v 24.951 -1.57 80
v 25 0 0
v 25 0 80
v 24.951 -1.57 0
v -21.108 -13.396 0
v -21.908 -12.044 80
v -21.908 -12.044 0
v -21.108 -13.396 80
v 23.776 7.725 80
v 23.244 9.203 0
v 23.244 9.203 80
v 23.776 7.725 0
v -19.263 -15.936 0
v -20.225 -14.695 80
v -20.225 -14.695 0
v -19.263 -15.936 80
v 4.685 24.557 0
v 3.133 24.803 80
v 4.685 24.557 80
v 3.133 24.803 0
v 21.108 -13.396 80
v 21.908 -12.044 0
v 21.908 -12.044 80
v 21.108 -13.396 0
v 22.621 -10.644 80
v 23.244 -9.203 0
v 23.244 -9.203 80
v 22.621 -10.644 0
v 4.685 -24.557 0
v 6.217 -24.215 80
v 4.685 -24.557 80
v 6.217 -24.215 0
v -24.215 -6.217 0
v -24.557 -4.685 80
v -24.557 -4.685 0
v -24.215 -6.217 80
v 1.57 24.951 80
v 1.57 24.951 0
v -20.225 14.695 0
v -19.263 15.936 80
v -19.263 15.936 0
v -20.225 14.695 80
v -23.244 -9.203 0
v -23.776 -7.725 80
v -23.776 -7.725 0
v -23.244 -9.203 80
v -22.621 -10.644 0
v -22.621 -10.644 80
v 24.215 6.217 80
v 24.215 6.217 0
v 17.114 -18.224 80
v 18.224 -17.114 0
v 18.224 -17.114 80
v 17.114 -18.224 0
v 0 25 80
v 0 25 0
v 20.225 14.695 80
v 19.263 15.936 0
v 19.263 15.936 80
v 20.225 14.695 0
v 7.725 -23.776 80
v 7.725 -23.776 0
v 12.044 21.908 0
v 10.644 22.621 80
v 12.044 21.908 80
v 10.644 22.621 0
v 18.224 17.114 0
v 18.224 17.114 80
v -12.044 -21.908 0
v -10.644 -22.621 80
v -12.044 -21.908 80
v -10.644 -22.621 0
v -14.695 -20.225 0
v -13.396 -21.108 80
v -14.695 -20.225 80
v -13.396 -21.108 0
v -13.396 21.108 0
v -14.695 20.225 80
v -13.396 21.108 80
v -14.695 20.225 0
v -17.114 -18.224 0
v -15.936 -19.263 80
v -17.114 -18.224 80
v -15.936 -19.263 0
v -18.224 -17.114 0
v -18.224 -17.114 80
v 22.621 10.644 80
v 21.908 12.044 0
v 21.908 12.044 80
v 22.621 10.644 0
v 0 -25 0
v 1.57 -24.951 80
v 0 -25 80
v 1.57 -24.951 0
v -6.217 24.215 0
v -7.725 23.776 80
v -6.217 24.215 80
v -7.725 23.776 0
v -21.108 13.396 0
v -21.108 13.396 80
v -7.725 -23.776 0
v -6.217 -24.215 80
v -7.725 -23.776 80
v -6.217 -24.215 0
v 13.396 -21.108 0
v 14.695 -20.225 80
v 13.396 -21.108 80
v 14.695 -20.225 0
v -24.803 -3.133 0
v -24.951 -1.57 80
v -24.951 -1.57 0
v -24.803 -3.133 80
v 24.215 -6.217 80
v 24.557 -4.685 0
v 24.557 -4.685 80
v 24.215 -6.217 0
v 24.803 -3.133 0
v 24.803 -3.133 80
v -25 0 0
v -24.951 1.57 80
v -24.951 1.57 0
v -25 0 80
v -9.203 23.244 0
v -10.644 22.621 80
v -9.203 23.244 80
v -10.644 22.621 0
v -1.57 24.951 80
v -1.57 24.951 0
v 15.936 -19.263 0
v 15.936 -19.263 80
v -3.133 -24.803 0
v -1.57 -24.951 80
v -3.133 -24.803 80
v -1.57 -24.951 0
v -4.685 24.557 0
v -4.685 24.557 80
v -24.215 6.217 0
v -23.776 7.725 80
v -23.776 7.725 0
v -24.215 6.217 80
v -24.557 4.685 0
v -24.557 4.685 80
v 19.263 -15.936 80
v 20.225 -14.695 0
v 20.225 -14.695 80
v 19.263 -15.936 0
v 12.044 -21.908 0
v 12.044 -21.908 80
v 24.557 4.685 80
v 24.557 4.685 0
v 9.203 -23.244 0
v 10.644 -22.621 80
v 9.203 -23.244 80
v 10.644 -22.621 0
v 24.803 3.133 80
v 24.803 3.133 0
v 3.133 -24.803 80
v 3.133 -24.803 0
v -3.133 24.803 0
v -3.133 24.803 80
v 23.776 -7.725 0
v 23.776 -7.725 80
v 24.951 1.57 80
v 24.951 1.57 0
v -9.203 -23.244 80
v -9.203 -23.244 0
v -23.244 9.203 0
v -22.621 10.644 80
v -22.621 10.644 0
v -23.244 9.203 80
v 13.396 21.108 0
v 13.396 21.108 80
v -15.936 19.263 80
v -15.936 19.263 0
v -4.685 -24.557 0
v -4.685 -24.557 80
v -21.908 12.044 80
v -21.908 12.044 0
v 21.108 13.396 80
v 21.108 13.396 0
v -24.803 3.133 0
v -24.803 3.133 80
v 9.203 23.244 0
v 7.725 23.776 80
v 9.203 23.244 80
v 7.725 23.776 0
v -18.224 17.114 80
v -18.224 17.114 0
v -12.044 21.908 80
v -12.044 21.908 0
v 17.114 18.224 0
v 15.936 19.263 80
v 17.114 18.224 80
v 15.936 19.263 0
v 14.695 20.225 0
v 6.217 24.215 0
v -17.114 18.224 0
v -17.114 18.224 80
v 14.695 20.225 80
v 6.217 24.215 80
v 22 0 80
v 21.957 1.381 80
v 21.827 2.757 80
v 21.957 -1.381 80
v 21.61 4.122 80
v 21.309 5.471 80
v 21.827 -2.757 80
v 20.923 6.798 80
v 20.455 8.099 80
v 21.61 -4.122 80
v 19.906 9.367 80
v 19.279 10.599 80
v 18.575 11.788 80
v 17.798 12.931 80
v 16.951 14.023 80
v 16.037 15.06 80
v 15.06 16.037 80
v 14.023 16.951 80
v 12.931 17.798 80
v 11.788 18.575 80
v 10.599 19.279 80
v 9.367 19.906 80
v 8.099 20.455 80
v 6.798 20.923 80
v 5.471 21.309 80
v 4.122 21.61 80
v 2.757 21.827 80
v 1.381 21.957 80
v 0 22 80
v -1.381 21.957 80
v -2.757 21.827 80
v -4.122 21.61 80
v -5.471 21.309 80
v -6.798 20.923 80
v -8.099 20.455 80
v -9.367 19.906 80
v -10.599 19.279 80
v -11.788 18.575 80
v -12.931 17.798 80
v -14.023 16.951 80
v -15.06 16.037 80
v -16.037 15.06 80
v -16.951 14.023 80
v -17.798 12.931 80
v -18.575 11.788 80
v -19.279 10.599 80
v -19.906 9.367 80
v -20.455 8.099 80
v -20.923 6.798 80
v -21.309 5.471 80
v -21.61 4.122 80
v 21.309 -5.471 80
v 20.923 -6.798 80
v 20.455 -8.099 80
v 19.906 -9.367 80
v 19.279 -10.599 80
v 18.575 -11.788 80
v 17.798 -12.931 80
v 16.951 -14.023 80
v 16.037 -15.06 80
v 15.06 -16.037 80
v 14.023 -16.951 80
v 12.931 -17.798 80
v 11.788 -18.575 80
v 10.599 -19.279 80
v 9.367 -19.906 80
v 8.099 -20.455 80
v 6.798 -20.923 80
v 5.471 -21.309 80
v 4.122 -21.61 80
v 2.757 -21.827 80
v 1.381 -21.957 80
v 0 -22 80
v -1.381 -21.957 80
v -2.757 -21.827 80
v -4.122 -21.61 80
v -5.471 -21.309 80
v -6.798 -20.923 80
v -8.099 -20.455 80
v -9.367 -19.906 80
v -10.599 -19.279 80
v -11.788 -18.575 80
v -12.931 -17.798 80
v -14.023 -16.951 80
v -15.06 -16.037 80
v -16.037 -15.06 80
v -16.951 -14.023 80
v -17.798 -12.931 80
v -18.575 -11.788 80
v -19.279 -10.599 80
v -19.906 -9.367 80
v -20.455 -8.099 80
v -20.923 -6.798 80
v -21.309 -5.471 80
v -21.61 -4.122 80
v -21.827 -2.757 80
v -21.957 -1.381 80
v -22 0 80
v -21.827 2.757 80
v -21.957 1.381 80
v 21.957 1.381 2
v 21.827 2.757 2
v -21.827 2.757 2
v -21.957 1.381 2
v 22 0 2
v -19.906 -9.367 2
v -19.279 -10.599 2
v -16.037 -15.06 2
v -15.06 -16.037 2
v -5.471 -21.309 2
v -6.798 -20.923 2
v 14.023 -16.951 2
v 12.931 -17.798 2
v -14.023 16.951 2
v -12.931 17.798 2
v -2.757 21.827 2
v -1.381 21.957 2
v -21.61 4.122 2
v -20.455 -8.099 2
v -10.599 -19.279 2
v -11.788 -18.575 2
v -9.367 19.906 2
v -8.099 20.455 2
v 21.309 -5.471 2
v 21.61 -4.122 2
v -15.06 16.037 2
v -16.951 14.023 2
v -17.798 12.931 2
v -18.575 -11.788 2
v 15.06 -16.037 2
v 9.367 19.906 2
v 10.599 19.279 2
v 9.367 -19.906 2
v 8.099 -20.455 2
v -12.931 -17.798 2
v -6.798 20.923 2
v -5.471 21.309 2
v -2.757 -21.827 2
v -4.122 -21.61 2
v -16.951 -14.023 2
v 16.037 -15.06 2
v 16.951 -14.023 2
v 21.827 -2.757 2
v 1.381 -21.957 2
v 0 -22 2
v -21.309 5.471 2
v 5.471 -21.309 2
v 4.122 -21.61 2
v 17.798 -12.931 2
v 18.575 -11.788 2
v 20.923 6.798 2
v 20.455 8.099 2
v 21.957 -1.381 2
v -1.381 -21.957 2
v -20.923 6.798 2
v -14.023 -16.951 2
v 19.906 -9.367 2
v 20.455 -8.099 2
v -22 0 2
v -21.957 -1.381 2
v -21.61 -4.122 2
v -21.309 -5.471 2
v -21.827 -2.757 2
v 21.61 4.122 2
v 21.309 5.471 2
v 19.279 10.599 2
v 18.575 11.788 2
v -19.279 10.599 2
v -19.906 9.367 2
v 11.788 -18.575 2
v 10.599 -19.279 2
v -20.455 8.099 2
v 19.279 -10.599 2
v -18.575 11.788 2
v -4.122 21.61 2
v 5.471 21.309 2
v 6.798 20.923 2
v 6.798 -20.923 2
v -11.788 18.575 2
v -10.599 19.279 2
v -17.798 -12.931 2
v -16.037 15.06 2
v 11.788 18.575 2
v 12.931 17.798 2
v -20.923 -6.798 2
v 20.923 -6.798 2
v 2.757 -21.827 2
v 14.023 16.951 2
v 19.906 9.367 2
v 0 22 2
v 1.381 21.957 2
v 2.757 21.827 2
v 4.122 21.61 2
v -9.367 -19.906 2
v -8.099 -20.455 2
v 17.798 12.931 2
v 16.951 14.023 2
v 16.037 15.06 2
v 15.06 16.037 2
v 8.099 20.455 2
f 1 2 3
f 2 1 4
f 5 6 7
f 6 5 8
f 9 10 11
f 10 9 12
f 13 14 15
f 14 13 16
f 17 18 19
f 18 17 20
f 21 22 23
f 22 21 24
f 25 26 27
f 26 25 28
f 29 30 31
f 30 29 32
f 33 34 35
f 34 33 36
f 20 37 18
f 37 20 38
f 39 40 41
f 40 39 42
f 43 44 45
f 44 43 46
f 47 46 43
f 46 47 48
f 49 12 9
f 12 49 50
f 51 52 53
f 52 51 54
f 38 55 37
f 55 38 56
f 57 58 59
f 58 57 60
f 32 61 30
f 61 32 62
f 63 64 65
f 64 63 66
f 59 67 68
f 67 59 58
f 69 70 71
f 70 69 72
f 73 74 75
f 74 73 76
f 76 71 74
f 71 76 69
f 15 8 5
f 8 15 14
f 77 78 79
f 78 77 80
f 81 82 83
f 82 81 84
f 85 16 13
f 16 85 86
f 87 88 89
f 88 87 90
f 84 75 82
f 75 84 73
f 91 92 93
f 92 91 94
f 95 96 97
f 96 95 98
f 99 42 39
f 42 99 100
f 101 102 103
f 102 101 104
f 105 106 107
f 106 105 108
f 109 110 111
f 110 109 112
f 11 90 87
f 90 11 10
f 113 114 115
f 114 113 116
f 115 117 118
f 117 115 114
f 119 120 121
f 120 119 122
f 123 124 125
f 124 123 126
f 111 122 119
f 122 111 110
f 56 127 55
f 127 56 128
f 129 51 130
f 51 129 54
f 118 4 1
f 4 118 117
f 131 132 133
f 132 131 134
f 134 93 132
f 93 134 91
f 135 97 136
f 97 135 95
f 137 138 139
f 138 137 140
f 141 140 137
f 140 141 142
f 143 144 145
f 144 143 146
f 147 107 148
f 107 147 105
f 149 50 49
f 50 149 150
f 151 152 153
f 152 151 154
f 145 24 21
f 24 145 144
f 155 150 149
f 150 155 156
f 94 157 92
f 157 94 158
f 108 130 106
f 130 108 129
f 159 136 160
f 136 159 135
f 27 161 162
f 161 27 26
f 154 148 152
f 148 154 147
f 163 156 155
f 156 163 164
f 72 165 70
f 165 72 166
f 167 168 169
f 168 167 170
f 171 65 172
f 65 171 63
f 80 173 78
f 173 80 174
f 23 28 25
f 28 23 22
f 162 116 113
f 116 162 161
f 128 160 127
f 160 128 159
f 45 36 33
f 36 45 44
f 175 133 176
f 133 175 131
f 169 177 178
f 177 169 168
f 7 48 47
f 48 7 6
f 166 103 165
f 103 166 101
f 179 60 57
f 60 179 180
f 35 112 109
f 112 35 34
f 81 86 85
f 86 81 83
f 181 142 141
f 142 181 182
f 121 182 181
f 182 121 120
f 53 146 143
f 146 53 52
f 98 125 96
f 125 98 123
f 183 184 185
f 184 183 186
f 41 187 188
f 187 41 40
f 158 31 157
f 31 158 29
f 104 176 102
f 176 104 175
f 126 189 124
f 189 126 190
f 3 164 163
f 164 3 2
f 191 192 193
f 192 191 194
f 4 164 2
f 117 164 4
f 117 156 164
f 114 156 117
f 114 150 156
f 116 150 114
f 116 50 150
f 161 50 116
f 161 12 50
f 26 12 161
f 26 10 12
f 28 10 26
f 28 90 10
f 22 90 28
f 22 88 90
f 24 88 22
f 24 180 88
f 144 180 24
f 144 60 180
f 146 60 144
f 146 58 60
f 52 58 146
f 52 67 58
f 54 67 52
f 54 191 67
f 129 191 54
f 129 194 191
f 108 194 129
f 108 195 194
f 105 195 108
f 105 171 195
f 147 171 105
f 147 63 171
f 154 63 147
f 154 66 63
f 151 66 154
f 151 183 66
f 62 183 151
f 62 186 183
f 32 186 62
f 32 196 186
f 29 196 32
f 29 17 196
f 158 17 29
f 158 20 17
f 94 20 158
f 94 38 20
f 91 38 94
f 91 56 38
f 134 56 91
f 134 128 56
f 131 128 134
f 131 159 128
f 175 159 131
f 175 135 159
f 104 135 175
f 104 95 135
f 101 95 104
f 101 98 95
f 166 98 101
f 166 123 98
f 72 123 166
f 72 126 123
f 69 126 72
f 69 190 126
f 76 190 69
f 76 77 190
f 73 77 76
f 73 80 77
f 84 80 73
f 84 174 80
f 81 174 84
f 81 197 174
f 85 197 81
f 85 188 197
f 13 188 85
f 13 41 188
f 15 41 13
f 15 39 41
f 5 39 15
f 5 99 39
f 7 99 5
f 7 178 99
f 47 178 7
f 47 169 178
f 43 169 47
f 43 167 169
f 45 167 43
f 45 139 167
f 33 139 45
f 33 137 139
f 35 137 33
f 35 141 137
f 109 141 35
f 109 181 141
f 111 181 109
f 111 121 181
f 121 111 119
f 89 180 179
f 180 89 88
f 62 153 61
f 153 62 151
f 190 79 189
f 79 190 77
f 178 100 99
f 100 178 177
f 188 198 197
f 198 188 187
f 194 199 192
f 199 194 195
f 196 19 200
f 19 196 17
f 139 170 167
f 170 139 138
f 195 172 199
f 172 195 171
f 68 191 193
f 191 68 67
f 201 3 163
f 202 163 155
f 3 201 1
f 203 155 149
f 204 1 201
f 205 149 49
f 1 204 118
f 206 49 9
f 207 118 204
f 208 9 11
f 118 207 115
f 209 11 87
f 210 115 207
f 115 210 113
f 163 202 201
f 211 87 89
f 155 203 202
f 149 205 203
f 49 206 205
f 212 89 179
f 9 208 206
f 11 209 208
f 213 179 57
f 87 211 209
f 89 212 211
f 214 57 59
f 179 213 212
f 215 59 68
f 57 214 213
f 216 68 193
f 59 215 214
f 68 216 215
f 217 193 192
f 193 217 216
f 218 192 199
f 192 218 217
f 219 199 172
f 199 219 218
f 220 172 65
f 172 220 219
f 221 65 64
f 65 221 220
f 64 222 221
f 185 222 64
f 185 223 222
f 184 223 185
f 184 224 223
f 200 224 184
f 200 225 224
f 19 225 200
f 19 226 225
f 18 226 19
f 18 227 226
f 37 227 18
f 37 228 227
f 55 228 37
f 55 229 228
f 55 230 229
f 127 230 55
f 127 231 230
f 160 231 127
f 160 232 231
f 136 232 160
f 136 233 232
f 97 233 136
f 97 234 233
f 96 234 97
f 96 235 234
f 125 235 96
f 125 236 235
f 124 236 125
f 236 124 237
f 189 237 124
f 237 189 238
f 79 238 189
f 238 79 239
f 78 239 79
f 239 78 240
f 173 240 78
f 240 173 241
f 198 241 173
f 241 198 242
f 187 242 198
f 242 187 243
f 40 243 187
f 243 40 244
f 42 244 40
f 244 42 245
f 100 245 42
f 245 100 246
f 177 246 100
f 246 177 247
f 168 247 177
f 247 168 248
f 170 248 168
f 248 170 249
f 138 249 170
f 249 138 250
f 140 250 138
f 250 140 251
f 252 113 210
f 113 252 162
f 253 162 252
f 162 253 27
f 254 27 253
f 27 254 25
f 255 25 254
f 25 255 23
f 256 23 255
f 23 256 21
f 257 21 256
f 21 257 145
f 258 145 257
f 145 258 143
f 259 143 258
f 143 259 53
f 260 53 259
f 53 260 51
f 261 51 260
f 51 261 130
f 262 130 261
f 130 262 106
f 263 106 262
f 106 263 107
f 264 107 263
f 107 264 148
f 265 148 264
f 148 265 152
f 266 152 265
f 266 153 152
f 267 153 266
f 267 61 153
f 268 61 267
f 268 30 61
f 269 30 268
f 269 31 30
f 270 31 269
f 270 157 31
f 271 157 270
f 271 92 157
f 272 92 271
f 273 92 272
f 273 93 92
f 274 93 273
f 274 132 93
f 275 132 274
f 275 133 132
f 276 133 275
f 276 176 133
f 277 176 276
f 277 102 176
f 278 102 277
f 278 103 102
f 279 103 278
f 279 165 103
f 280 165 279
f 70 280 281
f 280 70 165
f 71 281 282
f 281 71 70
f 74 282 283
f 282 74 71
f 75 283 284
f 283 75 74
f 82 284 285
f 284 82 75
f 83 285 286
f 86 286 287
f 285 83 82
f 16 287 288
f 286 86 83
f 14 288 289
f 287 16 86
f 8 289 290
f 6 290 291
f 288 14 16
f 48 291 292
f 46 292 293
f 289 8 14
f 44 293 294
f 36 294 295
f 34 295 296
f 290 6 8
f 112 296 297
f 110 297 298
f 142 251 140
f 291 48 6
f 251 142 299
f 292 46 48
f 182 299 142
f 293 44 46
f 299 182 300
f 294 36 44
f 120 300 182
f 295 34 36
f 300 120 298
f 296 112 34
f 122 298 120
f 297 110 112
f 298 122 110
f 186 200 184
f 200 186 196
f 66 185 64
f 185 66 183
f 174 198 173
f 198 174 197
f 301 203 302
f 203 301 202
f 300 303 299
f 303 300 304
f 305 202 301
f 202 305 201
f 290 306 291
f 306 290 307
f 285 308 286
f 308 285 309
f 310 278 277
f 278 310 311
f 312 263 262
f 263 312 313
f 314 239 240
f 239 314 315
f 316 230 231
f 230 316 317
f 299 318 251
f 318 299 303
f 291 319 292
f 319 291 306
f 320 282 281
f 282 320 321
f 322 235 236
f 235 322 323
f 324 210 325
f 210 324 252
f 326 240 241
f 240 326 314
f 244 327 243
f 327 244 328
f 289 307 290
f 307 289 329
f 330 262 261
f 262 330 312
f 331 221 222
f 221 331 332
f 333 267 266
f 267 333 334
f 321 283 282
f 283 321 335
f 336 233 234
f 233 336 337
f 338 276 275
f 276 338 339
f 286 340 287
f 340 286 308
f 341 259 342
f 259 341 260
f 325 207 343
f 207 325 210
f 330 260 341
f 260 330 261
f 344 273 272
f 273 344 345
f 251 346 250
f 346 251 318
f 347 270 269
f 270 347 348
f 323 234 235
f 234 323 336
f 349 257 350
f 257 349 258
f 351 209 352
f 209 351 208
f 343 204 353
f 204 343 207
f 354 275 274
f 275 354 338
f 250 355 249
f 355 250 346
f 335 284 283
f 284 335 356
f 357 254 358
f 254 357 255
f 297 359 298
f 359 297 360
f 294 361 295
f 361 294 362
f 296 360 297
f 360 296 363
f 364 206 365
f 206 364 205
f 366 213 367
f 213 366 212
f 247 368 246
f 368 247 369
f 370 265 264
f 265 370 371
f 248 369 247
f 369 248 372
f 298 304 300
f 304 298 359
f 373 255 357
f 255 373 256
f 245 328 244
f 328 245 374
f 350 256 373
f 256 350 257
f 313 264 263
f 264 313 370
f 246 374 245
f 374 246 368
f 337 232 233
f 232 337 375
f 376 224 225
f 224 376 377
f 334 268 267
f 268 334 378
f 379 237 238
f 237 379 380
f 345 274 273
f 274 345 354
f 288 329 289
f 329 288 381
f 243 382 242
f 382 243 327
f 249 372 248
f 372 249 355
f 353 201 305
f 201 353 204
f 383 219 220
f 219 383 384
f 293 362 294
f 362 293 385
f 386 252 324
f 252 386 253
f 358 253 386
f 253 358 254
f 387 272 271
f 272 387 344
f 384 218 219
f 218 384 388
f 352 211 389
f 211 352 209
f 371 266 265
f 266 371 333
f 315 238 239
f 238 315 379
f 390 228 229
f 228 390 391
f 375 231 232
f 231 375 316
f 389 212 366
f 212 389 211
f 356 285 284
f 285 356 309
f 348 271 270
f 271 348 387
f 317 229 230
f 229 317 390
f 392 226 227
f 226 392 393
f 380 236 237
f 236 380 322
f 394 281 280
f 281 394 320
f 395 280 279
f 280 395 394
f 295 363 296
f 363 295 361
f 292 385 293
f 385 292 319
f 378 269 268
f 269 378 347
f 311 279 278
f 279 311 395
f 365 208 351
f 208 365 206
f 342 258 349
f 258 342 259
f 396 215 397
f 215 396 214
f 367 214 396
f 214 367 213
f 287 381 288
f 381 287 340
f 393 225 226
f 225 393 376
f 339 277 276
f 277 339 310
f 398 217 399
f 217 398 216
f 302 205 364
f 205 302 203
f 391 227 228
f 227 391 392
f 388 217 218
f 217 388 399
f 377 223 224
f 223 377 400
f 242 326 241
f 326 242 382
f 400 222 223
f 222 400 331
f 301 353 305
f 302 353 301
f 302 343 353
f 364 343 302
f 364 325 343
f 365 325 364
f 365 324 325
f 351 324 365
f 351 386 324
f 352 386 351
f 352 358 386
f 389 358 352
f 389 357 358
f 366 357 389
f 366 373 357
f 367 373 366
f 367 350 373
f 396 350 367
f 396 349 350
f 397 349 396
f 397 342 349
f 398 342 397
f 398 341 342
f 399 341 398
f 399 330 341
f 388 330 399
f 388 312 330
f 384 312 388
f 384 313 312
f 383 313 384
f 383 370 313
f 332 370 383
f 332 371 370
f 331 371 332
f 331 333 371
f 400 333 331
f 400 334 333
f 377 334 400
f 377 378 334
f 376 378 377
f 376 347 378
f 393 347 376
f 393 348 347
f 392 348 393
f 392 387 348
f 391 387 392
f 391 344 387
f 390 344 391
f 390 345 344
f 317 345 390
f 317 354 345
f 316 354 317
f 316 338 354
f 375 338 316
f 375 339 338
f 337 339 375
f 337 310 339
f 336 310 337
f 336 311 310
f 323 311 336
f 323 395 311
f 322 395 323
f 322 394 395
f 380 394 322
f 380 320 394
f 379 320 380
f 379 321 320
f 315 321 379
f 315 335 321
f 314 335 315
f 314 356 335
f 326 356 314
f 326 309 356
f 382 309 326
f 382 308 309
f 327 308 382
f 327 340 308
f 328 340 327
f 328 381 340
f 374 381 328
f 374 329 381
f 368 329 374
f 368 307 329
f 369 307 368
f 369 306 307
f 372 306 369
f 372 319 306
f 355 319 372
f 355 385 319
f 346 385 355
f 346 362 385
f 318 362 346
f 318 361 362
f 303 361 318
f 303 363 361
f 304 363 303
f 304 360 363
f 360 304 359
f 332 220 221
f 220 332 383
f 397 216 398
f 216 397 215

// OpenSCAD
difference() {
  difference() {
    linear_extrude(height = 80.0) {
      circle(r = 25.0, $fn = 100);
    }
    translate([0, 0, 2.0]) {
      linear_extrude(height = 78.0) {
        circle(r = 22.0, $fn = 100);
      }
    }
  }
  translate([0, 0, 82.0]) {
    linear_extrude(height = 18.0) {
      circle(r = 6.0, $fn = 100);
    }
  }
}
$fn = 50;
